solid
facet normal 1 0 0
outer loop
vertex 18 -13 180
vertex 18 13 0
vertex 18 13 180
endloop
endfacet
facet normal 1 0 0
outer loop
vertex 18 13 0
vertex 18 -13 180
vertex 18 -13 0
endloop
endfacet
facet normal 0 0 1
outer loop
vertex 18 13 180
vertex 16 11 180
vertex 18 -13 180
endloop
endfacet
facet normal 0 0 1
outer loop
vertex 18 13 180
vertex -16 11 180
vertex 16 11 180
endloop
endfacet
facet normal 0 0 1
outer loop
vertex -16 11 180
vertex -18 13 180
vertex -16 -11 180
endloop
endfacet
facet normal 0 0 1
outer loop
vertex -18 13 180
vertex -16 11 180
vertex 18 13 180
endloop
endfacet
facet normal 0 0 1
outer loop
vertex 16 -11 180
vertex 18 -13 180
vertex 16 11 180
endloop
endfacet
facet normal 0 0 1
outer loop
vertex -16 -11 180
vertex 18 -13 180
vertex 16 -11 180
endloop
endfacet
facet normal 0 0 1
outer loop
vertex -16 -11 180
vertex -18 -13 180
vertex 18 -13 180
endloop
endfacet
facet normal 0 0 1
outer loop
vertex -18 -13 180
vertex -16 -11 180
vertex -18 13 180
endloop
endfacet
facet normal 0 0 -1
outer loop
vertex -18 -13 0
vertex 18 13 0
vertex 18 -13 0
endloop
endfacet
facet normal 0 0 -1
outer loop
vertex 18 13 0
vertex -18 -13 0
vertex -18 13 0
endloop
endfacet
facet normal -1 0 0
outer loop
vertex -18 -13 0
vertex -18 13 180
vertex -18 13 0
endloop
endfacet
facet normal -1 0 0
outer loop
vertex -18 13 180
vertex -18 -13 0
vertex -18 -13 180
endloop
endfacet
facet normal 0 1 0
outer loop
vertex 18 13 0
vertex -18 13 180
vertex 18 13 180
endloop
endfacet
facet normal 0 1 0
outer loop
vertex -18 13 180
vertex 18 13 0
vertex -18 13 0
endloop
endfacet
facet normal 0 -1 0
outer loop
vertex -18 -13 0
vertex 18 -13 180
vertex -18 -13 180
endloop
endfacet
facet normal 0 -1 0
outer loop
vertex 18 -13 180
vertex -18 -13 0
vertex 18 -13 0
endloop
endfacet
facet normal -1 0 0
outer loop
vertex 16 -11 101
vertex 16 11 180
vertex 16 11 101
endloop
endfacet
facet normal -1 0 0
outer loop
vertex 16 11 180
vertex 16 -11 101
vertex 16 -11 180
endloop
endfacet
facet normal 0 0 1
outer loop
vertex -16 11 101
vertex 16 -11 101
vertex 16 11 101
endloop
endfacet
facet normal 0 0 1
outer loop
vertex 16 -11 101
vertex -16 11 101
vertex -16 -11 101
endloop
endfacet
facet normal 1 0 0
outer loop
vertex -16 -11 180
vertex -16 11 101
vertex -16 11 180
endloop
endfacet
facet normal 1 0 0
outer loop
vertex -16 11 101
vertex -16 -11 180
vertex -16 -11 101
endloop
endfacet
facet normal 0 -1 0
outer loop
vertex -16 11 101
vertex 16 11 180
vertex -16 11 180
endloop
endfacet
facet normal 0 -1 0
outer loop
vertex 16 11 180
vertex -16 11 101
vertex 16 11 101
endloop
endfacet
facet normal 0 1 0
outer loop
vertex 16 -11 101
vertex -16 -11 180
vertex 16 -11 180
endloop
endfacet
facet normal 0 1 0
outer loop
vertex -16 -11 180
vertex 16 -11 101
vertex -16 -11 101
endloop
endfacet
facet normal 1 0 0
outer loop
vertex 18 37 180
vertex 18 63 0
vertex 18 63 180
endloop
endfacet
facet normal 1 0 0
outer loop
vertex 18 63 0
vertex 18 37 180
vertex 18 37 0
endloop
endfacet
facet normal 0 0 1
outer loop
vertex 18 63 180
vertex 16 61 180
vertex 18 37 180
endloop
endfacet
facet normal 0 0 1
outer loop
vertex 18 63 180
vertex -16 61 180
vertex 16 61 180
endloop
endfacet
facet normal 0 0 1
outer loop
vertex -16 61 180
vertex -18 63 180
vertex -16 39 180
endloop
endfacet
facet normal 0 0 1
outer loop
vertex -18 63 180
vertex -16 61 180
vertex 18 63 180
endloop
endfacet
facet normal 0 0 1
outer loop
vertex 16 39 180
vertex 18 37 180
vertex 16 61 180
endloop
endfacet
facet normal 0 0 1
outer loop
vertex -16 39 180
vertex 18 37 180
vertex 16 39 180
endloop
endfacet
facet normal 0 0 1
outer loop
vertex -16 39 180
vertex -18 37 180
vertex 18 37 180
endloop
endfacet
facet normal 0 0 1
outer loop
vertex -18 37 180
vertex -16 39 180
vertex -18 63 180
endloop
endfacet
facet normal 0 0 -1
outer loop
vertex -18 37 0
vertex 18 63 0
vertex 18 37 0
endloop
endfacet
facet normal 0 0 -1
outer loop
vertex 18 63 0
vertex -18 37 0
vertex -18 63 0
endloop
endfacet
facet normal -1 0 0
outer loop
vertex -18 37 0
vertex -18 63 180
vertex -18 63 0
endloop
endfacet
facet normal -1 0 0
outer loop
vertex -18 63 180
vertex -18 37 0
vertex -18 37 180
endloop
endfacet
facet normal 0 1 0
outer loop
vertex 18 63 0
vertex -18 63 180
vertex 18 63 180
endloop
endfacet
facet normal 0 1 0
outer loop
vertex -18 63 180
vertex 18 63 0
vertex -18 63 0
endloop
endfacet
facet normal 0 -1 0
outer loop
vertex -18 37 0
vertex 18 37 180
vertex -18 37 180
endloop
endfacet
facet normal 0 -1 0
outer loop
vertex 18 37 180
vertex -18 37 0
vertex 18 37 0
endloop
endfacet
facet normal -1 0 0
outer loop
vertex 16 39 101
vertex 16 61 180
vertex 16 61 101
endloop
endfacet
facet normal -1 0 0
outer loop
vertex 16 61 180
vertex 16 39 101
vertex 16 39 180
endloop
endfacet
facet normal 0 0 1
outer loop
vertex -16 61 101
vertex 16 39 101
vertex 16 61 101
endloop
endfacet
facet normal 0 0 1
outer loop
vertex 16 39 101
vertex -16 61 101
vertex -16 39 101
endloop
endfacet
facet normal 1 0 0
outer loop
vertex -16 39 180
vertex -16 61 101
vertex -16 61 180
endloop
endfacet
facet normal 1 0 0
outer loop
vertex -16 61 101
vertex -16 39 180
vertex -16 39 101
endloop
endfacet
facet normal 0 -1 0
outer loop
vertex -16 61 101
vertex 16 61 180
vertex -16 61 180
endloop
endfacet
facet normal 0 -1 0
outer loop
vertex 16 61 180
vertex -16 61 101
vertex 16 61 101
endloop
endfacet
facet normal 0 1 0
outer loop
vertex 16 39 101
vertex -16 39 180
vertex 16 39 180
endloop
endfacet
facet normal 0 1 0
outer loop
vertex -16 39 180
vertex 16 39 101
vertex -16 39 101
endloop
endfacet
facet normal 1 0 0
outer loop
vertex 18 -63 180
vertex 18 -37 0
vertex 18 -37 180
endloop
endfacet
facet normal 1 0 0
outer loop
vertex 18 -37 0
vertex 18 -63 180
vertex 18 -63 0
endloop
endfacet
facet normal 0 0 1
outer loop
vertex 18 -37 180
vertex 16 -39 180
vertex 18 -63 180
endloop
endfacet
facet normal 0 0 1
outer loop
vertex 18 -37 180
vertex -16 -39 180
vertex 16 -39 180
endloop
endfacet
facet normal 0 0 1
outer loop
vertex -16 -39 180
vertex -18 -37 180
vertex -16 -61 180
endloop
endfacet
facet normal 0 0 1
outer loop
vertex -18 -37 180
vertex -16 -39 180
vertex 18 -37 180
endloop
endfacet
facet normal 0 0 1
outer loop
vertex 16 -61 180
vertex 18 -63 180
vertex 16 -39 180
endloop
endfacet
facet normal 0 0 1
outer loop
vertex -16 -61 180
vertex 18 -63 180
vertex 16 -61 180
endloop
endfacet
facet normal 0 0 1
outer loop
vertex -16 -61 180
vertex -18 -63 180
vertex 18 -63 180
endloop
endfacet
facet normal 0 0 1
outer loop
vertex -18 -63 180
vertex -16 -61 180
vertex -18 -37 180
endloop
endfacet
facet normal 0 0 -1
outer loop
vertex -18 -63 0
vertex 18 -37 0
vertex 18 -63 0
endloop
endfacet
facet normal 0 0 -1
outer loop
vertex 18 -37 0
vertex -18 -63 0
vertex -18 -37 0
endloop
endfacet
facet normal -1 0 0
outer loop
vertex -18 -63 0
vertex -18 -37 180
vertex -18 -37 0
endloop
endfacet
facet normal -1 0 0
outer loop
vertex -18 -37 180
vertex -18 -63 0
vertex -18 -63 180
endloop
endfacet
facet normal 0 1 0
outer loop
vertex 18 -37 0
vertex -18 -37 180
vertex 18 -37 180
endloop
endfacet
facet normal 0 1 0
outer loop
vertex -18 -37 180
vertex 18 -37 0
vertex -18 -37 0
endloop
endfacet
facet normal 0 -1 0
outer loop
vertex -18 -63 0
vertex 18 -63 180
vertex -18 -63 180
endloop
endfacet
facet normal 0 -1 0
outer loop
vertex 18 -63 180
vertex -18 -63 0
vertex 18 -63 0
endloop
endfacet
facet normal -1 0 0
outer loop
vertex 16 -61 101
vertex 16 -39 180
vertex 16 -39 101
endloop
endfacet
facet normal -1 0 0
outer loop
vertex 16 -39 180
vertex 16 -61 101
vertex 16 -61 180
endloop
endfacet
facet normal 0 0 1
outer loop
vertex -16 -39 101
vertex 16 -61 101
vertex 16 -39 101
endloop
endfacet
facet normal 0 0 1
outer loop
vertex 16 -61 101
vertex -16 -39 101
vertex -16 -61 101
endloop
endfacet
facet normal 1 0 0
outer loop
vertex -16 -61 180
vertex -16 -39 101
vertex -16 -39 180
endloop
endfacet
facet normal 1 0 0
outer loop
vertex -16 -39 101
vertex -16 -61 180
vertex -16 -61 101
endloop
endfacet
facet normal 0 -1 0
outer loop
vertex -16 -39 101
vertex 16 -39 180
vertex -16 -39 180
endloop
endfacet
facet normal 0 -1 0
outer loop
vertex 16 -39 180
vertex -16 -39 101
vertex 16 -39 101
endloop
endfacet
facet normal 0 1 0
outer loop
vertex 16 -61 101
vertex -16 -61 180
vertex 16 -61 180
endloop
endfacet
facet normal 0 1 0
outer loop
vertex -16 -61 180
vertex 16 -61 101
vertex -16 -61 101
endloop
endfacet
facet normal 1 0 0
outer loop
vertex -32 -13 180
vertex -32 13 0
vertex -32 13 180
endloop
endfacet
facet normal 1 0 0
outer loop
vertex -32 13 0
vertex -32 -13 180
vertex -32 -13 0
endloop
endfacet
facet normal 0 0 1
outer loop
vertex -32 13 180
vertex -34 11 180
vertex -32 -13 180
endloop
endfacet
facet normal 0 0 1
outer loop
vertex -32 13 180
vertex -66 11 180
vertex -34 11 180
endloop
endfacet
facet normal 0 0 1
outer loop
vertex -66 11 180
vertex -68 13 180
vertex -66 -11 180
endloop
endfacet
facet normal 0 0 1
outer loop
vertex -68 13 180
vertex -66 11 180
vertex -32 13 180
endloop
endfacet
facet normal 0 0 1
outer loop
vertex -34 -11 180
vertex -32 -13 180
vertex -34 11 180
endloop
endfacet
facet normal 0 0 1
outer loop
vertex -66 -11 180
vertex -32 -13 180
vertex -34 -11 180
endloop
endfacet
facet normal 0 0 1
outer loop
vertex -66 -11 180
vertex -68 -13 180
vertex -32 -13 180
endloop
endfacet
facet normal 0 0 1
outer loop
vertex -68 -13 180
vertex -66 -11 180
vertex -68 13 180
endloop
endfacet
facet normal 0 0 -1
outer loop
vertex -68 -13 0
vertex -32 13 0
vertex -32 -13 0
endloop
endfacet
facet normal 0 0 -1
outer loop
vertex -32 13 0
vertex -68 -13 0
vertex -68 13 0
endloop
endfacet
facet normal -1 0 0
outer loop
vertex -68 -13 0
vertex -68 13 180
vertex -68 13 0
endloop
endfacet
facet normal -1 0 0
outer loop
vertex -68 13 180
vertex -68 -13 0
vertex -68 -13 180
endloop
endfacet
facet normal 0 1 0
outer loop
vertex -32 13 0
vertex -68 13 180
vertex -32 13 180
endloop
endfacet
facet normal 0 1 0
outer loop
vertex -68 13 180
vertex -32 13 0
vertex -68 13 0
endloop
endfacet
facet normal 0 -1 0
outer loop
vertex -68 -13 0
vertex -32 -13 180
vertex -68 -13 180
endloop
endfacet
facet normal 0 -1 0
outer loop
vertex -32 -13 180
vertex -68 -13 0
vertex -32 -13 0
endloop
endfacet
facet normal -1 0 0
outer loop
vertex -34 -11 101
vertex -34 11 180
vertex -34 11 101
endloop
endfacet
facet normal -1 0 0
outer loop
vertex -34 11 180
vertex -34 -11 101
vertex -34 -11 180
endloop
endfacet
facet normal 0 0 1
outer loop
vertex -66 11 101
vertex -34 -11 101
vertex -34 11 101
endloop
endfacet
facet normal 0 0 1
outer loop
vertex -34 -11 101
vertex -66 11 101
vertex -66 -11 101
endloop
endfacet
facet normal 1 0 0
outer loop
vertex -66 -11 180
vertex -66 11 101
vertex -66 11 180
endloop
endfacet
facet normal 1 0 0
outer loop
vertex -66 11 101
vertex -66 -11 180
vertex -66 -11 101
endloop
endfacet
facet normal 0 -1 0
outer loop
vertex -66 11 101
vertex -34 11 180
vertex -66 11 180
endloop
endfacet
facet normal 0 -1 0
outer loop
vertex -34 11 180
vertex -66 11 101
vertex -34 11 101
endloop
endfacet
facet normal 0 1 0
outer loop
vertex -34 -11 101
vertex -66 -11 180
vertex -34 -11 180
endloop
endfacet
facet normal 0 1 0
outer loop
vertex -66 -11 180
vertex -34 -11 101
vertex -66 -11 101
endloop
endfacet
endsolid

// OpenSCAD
cubo_externo01();
cubo_externo02();
cubo_externo03();
cubo_externo04();
//Inicio do pé 01
module cubo_externo01(){
    difference(){
translate([0,0,90]){
    color("red")
cube([36,26,180],center=true, $nf=400);
}
cubo_interno01();
}
}
module cubo_interno01(){
translate([0,0,141]){
    color("blue")
cube([32,22,80],center=true, $nf=400);
}
}
//Fim do pé 01

//Inicio do pé 02
module cubo_externo02(){
    difference(){
translate([0,50,90]){
    color("red")
cube([36,26,180],center=true, $nf=400);
}
cubo_interno02();
}
}
module cubo_interno02(){
translate([0,50,141]){
    color("blue")
cube([32,22,80],center=true, $nf=400);
}
}
//Fim do pé 02

//Inicio do pé 03
module cubo_externo03(){
    difference(){
translate([0,-50,90]){
    color("red")
cube([36,26,180],center=true, $nf=400);
}
cubo_interno03();
}
}
module cubo_interno03(){
translate([0,-50,141]){
    color("blue")
cube([32,22,80],center=true, $nf=400);
}
}
//Fim do pé 03

//Inicio do pé 03
module cubo_externo04(){
    difference(){
translate([-50,0,90]){
    color("red")
cube([36,26,180],center=true, $nf=400);
}
cubo_interno04();
}
}
module cubo_interno04(){
translate([-50,0,141]){
    color("blue")
cube([32,22,80],center=true, $nf=400);
}
}
//Fim do pé 03
